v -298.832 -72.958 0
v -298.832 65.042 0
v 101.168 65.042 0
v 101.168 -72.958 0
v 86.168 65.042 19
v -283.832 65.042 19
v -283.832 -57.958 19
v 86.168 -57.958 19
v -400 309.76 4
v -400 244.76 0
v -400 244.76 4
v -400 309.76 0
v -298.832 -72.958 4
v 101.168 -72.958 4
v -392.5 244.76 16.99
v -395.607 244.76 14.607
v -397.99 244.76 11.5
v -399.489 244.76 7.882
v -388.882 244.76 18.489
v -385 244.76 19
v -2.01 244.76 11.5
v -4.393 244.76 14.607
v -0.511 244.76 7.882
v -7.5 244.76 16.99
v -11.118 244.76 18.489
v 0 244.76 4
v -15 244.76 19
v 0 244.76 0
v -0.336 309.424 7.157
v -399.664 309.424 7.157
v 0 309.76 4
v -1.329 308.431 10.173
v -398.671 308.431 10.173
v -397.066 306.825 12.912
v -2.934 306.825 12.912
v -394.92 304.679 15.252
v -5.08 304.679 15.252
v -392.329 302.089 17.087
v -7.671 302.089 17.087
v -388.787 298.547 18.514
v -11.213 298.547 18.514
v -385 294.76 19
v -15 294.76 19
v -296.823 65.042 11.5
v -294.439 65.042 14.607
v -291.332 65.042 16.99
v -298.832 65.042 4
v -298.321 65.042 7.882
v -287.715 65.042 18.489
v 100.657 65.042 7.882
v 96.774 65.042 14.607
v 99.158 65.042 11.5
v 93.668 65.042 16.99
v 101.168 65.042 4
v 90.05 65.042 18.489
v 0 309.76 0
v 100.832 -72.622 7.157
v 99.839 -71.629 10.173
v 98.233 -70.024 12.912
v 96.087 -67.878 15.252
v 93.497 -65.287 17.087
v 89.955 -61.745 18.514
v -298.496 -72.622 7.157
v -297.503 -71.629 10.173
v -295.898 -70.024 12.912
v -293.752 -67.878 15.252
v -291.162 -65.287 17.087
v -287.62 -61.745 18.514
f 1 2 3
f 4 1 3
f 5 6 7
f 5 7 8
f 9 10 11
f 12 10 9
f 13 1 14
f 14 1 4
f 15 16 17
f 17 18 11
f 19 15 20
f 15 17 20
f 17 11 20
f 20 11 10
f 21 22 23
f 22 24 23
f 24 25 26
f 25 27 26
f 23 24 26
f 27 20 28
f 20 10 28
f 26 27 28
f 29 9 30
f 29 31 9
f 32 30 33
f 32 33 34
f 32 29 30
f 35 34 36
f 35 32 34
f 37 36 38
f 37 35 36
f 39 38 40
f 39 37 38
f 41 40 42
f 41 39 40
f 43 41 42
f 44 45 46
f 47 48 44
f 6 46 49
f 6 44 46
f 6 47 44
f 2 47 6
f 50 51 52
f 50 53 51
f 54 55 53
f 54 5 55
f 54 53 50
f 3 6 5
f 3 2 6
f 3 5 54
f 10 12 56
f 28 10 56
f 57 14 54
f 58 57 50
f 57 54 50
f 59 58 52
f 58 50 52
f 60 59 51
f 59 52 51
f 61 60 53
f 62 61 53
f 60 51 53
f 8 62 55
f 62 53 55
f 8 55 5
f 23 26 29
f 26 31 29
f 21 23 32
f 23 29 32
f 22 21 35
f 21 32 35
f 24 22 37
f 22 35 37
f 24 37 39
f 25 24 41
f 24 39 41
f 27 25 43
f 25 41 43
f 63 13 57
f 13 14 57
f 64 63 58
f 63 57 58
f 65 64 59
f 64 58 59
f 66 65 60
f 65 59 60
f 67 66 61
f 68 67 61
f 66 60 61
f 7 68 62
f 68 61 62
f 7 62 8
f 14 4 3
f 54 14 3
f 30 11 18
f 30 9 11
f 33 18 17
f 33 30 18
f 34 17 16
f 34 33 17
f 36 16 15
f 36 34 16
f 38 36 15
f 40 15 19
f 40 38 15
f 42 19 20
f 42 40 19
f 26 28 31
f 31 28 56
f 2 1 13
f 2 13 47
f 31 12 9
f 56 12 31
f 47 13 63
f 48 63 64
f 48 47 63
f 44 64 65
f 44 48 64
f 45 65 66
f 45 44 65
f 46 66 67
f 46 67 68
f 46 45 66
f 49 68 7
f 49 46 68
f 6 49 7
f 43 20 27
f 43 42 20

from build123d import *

# Parameters (mm, degrees)
F1_W     = 400
F1_H     = 65
F2_DEPTH = 19
F0_W     = 400
F0_H     = 138
F3_DEPTH = 19
F4_R     = 15
F4_2_R   = 15


with BuildPart() as f2:
    # F1 (on Top) → F2 (new body)
    with BuildSketch(Plane.XY):
        with Locations((-200, 277.2595660102)):
            Rectangle(F1_W, F1_H)
    extrude(amount=F2_DEPTH)

    # F4
    f4_edges = [f2.edges().sort_by_distance(p)[0] for p in [
        (-200, 309.759566, 19),
        (-400, 277.259566, 19),
        (0, 277.259566, 19),
    ]]
    fillet(f4_edges, radius=F4_R)


with BuildPart() as f3:
    # F0 (on Top) → F3 (new body)
    with BuildSketch(Plane.XY):
        with Locations((-98.8323359787, -3.9581097662)):
            Rectangle(F0_W, F0_H)
    extrude(amount=F3_DEPTH)

    # F4#2
    f4_2_edges = [f3.edges().sort_by_distance(p)[0] for p in [
        (-98.832336, -72.95811, 19),
        (-298.832336, -3.95811, 19),
        (101.167664, -3.95811, 19),
    ]]
    fillet(f4_2_edges, radius=F4_2_R)


solid = Compound([f2.part, f3.part])
